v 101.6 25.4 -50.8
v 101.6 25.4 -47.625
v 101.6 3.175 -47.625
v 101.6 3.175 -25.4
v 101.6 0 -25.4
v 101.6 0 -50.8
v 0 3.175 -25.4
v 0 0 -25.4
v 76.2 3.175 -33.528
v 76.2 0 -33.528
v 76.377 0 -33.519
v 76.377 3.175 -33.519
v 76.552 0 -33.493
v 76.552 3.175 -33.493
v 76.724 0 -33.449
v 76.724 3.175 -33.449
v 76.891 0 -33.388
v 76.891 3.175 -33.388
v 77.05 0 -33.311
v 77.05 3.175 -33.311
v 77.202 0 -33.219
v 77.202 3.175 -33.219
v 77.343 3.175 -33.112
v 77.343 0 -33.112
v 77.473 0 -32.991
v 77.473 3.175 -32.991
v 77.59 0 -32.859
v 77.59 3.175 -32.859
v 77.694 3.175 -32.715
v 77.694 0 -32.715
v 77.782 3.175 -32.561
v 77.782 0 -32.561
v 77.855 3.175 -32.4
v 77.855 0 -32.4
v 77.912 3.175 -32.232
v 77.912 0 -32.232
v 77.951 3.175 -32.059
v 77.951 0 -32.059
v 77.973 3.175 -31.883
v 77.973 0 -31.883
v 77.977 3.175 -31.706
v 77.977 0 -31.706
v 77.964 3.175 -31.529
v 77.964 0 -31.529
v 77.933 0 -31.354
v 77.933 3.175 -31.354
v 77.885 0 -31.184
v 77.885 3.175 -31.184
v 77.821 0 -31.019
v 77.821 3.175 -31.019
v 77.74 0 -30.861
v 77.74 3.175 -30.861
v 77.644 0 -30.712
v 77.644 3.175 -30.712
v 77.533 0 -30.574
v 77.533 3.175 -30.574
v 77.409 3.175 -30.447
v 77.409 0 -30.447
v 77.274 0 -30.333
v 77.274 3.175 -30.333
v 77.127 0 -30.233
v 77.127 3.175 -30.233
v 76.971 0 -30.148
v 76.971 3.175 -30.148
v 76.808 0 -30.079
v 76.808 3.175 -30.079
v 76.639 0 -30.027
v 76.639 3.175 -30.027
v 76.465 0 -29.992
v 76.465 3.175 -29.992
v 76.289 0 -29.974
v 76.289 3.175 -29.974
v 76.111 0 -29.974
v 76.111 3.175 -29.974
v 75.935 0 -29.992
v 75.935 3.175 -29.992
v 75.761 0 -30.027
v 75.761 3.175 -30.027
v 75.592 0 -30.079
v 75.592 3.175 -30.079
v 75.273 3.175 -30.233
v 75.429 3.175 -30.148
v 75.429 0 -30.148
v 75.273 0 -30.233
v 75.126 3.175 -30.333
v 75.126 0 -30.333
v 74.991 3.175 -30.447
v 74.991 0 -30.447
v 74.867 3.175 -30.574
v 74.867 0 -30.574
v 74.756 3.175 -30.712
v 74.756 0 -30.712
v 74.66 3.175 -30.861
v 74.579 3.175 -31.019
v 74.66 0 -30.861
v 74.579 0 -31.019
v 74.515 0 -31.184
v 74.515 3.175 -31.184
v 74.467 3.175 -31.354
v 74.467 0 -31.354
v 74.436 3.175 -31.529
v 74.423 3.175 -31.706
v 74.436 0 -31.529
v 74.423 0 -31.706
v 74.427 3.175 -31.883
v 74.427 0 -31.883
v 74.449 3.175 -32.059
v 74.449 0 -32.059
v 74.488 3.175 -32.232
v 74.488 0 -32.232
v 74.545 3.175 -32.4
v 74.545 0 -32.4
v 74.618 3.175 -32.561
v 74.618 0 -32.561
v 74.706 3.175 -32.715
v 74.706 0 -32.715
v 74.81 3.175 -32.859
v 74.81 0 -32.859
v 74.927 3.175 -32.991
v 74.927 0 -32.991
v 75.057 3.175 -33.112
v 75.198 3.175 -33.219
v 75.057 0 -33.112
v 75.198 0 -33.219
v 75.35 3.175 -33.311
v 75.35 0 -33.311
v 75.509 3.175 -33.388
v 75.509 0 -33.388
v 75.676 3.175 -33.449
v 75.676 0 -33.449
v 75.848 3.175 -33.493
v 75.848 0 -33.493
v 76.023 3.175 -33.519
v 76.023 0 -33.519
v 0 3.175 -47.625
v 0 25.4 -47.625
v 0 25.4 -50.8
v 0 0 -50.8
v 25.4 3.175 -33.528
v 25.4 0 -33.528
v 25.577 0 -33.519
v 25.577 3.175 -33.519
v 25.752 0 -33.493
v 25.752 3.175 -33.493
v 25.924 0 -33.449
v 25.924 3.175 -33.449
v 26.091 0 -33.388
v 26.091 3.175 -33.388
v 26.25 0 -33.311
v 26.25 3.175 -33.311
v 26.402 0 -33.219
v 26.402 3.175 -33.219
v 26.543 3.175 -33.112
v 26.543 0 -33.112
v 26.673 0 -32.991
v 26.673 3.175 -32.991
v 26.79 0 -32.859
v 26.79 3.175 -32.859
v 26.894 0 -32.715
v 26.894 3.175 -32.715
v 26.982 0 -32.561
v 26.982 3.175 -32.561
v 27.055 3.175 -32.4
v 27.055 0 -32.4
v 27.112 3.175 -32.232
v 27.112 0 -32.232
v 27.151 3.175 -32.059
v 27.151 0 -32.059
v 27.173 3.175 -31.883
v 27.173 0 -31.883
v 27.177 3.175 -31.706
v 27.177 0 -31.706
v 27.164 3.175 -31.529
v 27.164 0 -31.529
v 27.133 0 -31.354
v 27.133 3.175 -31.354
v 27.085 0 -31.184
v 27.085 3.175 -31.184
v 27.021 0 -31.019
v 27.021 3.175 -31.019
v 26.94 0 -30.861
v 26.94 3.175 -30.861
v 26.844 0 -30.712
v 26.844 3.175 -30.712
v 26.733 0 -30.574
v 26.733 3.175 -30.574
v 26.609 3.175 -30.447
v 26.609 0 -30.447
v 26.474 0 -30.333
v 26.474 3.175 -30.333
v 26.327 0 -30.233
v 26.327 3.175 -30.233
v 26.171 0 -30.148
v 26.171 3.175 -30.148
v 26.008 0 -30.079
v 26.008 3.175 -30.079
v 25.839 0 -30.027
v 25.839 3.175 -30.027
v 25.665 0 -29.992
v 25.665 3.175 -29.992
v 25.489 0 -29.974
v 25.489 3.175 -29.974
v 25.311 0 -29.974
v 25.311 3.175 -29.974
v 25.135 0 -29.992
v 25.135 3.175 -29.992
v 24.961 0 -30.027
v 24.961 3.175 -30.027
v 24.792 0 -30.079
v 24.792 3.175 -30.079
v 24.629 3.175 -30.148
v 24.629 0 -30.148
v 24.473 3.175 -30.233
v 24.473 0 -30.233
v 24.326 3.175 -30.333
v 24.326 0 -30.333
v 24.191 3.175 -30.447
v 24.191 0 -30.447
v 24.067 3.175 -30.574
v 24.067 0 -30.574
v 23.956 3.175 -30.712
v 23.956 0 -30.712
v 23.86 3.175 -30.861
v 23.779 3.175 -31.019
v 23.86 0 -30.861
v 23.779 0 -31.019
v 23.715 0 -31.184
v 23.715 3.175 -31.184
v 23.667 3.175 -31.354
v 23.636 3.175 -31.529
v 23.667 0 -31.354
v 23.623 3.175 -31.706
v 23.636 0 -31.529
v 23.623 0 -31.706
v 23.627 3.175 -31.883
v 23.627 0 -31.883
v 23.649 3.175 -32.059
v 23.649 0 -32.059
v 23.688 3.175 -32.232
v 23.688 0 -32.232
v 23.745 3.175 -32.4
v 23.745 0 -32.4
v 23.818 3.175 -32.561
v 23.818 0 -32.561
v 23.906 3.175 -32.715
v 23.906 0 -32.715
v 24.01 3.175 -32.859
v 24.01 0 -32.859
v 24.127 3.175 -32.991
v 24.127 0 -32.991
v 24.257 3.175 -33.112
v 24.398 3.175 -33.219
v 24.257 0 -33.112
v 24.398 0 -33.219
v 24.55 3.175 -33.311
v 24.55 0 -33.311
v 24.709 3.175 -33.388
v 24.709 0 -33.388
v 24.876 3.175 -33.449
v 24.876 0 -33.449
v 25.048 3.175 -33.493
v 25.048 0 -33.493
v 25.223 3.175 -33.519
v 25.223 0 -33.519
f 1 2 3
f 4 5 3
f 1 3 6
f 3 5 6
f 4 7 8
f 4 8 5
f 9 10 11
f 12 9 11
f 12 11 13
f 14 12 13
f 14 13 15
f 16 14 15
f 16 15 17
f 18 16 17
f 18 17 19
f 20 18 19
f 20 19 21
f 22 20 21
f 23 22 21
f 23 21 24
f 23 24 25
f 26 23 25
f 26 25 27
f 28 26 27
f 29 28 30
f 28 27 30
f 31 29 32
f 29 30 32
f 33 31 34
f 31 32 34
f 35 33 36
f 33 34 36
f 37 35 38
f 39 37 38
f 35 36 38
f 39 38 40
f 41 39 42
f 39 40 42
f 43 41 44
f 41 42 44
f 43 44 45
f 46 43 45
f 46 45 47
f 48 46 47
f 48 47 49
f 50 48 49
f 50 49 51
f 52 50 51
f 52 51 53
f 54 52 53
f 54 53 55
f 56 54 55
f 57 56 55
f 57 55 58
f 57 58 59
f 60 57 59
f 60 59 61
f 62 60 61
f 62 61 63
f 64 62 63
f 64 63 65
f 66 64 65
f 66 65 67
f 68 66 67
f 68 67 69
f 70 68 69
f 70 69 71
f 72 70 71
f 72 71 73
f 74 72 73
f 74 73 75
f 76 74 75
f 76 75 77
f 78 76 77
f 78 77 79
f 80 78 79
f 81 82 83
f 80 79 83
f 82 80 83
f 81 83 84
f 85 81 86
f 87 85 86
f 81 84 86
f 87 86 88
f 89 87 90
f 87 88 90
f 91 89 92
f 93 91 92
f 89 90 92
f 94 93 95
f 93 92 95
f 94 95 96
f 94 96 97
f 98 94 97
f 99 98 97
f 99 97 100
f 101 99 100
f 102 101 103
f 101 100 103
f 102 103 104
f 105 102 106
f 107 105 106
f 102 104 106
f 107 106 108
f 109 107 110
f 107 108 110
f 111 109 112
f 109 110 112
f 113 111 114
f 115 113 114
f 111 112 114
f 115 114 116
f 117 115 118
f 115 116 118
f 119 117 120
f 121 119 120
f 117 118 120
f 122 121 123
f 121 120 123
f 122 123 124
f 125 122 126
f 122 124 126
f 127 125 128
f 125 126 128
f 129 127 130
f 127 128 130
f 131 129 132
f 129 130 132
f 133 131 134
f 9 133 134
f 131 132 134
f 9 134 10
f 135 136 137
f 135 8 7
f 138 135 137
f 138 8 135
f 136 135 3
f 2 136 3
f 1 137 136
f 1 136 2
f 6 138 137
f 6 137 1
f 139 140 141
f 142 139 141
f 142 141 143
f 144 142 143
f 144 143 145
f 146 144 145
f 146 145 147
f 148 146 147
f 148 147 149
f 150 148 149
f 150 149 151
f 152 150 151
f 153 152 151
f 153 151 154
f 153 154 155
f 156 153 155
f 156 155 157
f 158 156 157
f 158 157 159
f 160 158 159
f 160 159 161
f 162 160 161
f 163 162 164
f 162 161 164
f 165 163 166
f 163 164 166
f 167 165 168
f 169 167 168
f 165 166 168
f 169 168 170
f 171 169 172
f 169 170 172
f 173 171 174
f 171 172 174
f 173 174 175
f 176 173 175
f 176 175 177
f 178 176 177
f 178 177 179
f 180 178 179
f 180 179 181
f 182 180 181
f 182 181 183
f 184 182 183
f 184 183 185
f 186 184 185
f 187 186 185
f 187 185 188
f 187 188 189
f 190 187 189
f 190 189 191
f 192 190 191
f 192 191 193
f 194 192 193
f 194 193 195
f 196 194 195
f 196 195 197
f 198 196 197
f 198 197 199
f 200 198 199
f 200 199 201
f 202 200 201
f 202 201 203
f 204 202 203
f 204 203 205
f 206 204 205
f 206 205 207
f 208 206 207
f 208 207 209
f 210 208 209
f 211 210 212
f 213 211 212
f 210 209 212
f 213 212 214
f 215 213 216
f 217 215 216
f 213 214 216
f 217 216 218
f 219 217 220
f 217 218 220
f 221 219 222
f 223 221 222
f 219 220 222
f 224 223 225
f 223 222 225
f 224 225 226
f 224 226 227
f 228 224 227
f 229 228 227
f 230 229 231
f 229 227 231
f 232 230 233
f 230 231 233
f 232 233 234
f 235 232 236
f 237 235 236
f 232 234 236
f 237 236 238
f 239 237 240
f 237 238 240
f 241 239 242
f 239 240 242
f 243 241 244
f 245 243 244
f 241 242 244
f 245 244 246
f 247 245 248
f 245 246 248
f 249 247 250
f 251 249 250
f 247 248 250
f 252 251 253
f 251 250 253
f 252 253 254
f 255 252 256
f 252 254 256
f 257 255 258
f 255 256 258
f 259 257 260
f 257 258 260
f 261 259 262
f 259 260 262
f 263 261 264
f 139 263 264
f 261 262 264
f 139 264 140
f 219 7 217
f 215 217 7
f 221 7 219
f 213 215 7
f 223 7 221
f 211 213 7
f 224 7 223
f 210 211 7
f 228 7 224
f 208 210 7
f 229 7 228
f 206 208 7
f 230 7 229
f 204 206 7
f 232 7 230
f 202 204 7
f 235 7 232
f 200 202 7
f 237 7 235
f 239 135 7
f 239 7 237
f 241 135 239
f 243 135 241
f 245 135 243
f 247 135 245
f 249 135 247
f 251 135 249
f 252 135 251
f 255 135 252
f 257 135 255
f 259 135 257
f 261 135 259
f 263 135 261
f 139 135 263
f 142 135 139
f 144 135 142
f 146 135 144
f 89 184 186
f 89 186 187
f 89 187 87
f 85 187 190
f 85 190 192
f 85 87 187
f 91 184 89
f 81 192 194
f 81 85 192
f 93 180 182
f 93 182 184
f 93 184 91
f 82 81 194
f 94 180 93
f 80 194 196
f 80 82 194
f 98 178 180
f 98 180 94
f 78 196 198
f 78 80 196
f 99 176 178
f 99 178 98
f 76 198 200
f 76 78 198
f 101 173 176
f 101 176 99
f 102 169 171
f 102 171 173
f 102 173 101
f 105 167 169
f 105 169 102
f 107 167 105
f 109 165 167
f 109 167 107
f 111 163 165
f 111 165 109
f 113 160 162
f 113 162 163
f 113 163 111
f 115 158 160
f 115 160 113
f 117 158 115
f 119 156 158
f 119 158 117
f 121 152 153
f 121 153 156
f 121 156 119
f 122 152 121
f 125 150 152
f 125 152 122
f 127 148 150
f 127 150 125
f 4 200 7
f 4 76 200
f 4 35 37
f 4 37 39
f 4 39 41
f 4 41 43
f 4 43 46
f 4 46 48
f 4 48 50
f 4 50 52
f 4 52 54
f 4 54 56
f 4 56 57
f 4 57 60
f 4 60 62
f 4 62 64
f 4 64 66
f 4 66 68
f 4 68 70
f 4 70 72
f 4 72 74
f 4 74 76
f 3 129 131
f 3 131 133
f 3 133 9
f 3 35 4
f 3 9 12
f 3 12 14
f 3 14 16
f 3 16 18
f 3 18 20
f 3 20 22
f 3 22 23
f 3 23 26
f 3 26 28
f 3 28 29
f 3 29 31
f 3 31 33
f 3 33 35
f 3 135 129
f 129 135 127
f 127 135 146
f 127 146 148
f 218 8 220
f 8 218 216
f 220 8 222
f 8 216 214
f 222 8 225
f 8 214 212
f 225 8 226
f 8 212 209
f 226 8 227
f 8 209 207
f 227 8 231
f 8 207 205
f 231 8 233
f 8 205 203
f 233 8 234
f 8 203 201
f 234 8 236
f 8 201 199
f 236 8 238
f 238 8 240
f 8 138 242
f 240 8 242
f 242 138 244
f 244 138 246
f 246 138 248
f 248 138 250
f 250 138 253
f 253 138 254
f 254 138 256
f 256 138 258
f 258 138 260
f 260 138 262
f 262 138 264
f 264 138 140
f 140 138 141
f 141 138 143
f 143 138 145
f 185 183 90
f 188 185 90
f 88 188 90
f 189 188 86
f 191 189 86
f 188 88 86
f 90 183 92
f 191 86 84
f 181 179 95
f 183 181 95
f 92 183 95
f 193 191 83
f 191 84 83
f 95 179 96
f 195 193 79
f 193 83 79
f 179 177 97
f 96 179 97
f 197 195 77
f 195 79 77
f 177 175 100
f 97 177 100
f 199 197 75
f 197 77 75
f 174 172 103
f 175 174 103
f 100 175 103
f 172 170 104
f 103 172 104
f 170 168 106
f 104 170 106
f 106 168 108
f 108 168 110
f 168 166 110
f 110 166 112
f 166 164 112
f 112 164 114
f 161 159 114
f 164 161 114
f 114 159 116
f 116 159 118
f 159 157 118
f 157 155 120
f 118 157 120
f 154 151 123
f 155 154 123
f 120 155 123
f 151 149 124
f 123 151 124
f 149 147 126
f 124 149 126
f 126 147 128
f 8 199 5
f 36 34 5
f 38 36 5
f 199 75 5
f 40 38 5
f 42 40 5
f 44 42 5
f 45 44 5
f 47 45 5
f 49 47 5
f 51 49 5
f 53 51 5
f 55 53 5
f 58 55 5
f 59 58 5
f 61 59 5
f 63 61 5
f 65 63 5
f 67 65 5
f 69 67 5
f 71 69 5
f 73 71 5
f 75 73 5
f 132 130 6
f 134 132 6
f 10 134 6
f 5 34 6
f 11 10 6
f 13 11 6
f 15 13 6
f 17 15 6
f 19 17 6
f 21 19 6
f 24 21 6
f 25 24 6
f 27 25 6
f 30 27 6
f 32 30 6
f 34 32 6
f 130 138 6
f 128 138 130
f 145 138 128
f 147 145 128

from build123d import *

# Parameters (mm, degrees)
SKETCH1_W           = 101.6
SKETCH1_H           = 50.8
BOSS_EXTRUDE1_DEPTH = 3.175
SKETCH3_W           = 101.6
SKETCH3_H           = 3.175
BOSS_EXTRUDE2_DEPTH = 22.225
SKETCH4_R           = 1.778
CUT_EXTRUDE1_DEPTH  = 117.397422652
SKETCH4_3_R         = 1.778
CUT_EXTRUDE2_DEPTH  = 22.225
SKETCH7_W           = 101.6
SKETCH7_H           = 3.175
CUT_EXTRUDE3_DEPTH  = 25.4


with BuildPart() as part:
    # Sketch1 → Boss-Extrude1 (new body)
    with BuildSketch(Plane(origin=(0, 0, 0), x_dir=(1, 0, 0), z_dir=(0, 1, 0))):
        with Locations((50.8, 25.4)):
            Rectangle(SKETCH1_W, SKETCH1_H)
    extrude(amount=BOSS_EXTRUDE1_DEPTH)

    # Sketch3 → Boss-Extrude2 (add)
    with BuildSketch(Plane(origin=(0, 3.175, 0), x_dir=(1, 0, 0), z_dir=(0, 1, 0))):
        with Locations((50.8, 49.2125)):
            Rectangle(SKETCH3_W, SKETCH3_H)
    extrude(amount=BOSS_EXTRUDE2_DEPTH)

    # Sketch4 → Cut-Extrude1 (cut, through all)
    with BuildSketch(Plane(origin=(0, 0, 0), x_dir=(-1, 0, 0), z_dir=(0, -1, 0))):
        with Locations((-25.4, 31.75)):
            Circle(SKETCH4_R)
    extrude(amount=-CUT_EXTRUDE1_DEPTH, mode=Mode.SUBTRACT)

    # Sketch4<3> → Cut-Extrude2 (cut)
    with BuildSketch(Plane(origin=(0, 0, 0), x_dir=(-1, 0, 0), z_dir=(0, -1, 0))):
        with Locations((-25.4, 31.75)):
            Circle(SKETCH4_3_R)
        with Locations((-76.2, 31.75)):
            Circle(SKETCH4_3_R)
    extrude(amount=-CUT_EXTRUDE2_DEPTH, mode=Mode.SUBTRACT)

    # Sketch7 → Cut-Extrude3 (cut)
    with BuildSketch(Plane.XY):
        with Locations((50.8, 1.5875)):
            Rectangle(SKETCH7_W, SKETCH7_H)
    extrude(amount=-CUT_EXTRUDE3_DEPTH, mode=Mode.SUBTRACT)


solid = part.part
